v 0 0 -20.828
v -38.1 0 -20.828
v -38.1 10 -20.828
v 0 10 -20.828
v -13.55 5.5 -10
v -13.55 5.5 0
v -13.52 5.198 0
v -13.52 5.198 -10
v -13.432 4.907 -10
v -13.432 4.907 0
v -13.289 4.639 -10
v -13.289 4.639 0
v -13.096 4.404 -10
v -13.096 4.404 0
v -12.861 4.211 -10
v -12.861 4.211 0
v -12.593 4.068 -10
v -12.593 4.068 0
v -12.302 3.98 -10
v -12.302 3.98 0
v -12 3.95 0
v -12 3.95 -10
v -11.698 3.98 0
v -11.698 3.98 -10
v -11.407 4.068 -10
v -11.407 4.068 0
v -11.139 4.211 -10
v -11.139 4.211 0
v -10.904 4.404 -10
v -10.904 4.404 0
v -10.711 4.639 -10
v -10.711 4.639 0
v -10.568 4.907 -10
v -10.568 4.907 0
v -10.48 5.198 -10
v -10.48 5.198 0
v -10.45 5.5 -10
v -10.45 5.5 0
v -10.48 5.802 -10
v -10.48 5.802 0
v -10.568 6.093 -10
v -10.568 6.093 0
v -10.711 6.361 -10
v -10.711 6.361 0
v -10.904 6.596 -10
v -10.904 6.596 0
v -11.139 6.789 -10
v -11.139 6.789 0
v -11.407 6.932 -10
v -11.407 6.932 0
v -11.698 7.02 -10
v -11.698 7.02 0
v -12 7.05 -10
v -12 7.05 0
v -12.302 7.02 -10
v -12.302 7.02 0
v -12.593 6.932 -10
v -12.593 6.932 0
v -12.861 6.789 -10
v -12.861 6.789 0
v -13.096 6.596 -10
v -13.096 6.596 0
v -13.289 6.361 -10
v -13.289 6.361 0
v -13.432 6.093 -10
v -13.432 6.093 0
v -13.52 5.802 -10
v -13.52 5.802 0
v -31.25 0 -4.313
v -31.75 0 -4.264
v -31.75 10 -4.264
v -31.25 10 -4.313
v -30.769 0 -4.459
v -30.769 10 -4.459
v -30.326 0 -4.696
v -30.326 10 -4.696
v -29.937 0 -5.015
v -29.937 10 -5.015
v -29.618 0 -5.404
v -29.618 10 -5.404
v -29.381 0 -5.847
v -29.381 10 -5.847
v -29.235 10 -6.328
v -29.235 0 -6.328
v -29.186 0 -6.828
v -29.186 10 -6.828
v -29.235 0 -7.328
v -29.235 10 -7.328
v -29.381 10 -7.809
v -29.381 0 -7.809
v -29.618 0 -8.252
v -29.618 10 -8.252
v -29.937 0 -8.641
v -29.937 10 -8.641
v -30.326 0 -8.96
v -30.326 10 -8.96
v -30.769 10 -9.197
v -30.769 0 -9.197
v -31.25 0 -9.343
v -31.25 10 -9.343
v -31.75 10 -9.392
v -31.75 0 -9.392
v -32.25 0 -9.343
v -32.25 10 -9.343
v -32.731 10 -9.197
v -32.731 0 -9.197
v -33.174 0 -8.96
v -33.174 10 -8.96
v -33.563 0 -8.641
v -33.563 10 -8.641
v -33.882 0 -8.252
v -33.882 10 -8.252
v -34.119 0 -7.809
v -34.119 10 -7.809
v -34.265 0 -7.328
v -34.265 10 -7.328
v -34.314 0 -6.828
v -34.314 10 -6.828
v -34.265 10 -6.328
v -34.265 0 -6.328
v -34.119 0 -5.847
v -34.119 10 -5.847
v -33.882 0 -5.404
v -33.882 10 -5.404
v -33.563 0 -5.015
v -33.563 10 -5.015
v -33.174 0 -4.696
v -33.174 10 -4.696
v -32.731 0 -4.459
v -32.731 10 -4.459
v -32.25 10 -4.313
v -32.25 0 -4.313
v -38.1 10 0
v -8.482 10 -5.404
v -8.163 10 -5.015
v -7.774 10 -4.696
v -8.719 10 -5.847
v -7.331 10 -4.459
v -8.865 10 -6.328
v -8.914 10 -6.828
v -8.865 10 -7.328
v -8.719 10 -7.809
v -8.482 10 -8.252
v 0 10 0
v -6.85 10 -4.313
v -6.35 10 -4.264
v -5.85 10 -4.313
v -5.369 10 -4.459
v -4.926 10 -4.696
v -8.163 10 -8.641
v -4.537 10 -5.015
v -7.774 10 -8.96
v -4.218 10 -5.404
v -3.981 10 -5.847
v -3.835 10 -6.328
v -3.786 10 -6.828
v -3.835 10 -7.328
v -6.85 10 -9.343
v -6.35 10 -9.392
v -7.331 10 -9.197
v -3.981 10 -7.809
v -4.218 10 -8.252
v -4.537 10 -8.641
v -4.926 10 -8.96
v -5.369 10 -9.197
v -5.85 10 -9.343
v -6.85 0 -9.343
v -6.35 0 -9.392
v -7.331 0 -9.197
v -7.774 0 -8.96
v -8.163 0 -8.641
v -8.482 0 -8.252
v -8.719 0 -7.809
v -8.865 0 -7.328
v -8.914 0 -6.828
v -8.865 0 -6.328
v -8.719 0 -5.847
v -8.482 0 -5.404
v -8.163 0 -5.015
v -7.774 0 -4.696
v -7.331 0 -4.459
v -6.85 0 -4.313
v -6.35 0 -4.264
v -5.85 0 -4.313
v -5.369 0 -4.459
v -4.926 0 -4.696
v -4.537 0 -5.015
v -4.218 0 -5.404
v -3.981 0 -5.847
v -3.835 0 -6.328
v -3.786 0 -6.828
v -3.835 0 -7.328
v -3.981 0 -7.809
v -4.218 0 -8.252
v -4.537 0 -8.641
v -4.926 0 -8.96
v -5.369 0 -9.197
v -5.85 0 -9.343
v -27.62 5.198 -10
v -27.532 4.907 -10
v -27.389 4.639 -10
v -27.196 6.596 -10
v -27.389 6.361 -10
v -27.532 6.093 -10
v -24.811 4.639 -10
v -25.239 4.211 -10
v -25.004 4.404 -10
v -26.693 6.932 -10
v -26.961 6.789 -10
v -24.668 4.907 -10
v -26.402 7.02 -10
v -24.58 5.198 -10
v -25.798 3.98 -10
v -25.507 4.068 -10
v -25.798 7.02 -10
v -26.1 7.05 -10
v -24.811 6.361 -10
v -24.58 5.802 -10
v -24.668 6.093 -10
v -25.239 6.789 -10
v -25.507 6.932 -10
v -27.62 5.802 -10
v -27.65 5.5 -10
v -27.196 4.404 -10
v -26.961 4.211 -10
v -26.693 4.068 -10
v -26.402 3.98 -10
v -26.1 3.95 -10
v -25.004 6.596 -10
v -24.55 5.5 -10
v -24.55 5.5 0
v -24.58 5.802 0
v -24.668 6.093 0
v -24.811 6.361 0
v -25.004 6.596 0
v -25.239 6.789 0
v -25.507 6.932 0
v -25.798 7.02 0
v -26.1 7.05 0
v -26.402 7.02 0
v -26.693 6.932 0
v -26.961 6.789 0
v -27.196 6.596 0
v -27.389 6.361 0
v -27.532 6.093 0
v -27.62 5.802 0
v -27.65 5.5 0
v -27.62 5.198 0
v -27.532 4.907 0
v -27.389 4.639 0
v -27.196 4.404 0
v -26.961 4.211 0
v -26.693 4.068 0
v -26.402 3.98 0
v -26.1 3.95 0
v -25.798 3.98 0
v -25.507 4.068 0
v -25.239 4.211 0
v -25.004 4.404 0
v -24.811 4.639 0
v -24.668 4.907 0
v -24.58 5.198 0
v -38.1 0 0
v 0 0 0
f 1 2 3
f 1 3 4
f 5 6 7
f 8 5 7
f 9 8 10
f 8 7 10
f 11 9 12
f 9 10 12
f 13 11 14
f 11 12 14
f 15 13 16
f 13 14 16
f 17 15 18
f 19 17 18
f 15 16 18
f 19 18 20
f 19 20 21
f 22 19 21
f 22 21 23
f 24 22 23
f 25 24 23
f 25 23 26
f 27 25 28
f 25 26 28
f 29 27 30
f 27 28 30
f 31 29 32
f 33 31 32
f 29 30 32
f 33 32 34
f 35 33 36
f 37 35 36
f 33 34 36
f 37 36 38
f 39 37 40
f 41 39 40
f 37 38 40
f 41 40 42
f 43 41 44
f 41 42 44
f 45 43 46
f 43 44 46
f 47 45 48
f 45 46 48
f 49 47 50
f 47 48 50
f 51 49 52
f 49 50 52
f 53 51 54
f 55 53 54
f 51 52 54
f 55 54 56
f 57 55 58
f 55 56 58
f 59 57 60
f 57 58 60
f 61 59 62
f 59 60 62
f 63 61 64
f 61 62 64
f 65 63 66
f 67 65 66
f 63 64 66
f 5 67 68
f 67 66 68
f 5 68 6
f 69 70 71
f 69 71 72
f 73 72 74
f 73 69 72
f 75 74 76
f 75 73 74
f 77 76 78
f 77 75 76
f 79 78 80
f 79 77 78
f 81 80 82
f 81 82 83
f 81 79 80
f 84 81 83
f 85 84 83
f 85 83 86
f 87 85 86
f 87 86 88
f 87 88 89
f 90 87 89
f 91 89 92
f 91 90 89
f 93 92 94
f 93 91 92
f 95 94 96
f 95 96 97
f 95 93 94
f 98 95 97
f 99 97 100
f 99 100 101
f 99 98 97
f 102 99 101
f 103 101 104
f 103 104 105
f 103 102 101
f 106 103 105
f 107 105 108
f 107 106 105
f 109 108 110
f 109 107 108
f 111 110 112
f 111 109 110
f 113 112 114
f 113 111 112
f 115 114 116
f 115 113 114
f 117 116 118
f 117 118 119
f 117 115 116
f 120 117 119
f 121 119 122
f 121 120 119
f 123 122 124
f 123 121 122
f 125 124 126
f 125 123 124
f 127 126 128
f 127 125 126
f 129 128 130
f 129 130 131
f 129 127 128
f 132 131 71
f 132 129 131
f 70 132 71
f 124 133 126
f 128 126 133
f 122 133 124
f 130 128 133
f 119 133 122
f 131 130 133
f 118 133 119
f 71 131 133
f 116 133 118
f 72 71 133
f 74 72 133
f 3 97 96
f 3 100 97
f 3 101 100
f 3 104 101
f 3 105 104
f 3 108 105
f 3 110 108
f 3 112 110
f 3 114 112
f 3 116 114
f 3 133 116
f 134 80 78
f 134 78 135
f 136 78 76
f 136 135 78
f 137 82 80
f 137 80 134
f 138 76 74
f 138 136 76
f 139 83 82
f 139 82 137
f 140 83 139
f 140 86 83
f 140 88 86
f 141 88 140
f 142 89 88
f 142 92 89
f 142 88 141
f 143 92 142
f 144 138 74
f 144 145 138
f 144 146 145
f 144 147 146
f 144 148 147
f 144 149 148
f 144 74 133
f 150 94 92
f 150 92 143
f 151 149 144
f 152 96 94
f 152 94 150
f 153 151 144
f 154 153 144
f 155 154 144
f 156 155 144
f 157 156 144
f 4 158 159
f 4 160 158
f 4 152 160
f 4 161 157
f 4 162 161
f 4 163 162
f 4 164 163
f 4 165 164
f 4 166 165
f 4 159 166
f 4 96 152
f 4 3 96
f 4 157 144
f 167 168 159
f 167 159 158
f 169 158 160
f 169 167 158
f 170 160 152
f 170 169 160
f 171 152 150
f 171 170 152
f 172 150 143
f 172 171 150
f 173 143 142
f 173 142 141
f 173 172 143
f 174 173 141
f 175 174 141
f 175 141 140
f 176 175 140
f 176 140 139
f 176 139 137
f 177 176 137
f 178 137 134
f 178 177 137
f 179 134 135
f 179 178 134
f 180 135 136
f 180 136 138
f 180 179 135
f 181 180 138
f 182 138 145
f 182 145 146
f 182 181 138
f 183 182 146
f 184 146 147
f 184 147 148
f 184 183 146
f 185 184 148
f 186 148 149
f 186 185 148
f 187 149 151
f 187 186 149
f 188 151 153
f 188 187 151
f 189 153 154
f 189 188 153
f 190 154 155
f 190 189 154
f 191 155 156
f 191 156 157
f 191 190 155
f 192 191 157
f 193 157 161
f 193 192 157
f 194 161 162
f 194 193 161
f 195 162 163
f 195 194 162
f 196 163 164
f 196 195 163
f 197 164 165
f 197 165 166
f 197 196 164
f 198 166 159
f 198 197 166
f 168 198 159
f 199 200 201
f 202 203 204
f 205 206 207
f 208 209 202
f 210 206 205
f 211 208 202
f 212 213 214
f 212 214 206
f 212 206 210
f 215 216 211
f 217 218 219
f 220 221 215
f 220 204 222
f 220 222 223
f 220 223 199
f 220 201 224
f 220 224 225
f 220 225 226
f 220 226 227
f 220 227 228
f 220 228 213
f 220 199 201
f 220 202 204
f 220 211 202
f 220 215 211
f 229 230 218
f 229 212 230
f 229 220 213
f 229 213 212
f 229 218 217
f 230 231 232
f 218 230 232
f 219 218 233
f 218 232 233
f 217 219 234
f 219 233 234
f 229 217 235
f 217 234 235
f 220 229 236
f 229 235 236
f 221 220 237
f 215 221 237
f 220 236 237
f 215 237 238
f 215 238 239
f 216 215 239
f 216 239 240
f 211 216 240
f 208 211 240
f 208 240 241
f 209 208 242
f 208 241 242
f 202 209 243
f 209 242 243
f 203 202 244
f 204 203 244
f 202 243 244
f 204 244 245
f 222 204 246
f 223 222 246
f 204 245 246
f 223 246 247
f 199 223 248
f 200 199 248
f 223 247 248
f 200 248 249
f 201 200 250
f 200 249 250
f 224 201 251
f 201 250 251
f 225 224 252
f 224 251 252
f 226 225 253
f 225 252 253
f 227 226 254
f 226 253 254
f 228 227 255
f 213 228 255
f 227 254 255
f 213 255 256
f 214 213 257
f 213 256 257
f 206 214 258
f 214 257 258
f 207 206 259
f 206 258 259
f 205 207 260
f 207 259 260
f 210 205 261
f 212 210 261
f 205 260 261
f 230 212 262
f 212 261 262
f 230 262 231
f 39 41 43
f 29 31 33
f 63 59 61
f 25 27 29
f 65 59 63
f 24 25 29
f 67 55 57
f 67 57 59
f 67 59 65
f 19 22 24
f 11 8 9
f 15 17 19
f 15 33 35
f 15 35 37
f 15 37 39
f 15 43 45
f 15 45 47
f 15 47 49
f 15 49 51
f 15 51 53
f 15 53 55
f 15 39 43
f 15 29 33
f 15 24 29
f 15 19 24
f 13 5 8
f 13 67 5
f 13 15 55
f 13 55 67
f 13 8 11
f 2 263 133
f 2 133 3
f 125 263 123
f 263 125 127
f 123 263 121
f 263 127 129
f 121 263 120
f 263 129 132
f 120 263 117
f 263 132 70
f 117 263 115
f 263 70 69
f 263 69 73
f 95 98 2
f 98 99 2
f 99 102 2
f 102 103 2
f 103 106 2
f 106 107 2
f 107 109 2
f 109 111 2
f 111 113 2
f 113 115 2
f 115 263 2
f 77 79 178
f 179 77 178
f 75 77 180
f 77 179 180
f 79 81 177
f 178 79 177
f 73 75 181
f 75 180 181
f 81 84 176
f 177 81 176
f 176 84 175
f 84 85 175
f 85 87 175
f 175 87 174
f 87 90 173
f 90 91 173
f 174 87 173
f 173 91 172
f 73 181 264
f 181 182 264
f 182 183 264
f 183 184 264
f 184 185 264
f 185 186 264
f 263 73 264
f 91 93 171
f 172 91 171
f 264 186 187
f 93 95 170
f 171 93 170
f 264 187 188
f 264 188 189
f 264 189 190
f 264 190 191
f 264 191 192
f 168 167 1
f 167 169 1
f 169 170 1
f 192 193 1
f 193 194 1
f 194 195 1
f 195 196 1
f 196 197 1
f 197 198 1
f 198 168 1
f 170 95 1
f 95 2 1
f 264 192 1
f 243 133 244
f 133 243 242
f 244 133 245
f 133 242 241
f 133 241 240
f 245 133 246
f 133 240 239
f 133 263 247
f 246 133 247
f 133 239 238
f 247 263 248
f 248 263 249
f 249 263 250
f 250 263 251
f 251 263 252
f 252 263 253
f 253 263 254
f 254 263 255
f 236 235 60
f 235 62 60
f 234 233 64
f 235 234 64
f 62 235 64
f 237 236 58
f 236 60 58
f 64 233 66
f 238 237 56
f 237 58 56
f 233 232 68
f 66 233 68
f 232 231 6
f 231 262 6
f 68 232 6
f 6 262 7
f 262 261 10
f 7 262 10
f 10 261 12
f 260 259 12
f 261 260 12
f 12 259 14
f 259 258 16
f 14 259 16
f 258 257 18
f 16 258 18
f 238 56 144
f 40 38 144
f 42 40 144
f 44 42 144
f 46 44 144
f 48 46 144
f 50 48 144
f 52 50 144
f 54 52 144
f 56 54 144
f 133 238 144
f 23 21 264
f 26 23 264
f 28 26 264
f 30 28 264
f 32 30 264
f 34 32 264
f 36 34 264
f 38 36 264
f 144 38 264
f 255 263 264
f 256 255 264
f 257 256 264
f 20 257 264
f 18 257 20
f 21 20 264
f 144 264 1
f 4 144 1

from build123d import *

# Parameters (mm, degrees)
SKETCH1_W           = 38.1
SKETCH1_H           = 20.828
SKETCH1_R           = 2.564
BOSS_EXTRUDE1_DEPTH = 10
SKETCH2_R           = 1.55
CUT_EXTRUDE1_DEPTH  = 10


with BuildPart() as part:
    # Sketch1 → Boss-Extrude1 (new body)
    with BuildSketch(Plane(origin=(0, 0, 0), x_dir=(1, 0, 0), z_dir=(0, 1, 0))):
        with Locations((-19.05, 10.414)):
            Rectangle(SKETCH1_W, SKETCH1_H)
        with Locations(Location((-31.75, 6.828, 0), (0, 0, 270))):
            Circle(SKETCH1_R, mode=Mode.SUBTRACT)
        with Locations(Location((-6.35, 6.828, 0), (0, 0, 90))):
            Circle(SKETCH1_R, mode=Mode.SUBTRACT)
    extrude(amount=BOSS_EXTRUDE1_DEPTH)

    # Sketch2 → Cut-Extrude1 (cut)
    with BuildSketch(Plane.XY):
        with Locations((-26.1, 5.5)):
            Circle(SKETCH2_R)
        with Locations(Location((-12, 5.5, 0), (0, 0, 180))):
            Circle(SKETCH2_R)
    extrude(amount=-CUT_EXTRUDE1_DEPTH, mode=Mode.SUBTRACT)


solid = part.part
